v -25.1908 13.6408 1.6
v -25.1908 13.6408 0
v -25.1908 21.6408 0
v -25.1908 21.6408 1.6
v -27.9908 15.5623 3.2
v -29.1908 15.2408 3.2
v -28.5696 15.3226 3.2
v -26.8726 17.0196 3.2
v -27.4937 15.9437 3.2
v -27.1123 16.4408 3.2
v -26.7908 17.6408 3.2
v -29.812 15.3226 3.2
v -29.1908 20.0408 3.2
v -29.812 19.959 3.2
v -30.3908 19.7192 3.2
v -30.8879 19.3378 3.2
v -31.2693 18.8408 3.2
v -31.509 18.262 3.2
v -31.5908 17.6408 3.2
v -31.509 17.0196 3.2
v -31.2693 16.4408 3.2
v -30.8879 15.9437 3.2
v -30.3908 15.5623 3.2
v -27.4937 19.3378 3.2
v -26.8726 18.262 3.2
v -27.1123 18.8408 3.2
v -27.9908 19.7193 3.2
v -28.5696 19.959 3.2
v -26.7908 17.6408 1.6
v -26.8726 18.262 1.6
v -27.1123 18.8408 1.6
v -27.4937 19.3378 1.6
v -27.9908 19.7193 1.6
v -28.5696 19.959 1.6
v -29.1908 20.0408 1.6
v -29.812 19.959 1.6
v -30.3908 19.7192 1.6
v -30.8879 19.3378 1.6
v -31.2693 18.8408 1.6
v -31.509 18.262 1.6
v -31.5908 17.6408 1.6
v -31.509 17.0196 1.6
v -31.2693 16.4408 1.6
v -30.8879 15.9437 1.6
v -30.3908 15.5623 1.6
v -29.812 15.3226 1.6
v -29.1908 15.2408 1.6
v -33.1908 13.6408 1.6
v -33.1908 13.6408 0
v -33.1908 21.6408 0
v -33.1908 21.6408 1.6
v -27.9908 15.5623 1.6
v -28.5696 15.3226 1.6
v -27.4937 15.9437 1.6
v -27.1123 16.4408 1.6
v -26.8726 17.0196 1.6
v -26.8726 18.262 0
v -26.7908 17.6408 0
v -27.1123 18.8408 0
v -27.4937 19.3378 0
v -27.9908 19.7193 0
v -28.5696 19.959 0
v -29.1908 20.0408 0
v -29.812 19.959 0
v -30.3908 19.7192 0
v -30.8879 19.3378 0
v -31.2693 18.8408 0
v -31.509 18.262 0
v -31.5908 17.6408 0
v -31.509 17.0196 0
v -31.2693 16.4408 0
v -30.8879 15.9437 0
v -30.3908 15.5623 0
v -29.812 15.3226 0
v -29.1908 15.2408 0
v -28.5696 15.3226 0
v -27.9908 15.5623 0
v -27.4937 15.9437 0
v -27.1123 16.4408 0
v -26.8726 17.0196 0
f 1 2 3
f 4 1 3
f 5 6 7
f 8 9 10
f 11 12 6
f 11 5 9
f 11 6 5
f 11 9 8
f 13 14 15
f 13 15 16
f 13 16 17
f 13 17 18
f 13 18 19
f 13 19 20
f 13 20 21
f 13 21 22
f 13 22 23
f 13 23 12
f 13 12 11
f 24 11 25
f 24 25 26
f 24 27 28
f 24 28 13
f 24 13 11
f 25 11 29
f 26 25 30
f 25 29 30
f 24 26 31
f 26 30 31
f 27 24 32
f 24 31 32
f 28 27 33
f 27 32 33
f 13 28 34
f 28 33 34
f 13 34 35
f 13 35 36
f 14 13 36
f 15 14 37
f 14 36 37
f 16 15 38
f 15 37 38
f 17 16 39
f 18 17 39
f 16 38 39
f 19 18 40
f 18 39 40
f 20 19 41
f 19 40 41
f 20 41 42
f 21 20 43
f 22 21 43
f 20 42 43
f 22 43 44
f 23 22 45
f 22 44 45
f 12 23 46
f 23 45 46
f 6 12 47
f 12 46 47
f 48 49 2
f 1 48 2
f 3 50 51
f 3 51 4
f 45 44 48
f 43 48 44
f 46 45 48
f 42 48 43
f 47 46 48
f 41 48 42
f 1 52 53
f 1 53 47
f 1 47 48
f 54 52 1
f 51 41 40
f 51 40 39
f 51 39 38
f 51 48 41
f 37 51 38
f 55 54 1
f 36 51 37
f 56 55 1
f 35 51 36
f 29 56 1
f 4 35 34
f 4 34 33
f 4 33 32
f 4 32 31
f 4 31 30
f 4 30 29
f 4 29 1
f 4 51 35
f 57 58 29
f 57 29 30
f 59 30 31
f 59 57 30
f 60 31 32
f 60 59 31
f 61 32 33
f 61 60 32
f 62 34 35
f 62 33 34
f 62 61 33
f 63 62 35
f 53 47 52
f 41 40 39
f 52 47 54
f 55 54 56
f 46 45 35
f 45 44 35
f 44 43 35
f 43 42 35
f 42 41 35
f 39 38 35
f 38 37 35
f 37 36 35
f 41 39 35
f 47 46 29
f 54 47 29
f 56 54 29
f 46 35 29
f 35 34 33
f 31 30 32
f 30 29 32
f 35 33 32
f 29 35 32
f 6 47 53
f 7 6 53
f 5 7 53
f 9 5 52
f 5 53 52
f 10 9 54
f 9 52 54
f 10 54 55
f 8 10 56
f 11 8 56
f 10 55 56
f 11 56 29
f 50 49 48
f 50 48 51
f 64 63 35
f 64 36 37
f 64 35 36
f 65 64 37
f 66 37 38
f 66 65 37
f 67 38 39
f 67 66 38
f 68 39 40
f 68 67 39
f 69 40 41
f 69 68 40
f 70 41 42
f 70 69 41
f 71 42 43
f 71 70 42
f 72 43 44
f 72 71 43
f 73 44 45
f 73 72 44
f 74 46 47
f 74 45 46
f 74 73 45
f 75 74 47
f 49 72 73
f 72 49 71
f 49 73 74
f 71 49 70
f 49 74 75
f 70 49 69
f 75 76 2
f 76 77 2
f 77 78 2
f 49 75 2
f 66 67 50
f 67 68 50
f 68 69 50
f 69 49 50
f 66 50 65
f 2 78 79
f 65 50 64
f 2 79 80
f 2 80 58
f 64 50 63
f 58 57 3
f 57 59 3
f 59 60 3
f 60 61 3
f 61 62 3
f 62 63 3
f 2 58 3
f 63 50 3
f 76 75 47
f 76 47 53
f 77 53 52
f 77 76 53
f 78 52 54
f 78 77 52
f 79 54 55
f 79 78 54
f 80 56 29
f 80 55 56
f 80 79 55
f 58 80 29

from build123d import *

# Parameters (mm, degrees)
F1_DEPTH = 3.2
F0_W     = 8
F0_H     = 8
F2_DEPTH = 1.6
F3_DEPTH = 1.6


with BuildPart() as f1:
    # F0 (on Top) → F1 (new body)
    with BuildSketch(Plane.XY):
        with BuildLine():
            Line((-29.190794, 15.240789), (-29.190794, 20.040789))
            ThreePointArc((-29.190794, 20.040789), (-31.590794, 17.640789), (-29.190794, 15.240789))
        make_face()
        with BuildLine():
            ThreePointArc((-29.190794, 15.240789), (-27.493737, 15.943732), (-26.790794, 17.640789))
            ThreePointArc((-26.790794, 17.640789), (-27.493737, 19.337845), (-29.190794, 20.040789))
            Line((-29.190794, 20.040789), (-29.190794, 15.240789))
        make_face()
    extrude(amount=F1_DEPTH)

    # F0 (on Top) → F2 (join)
    with BuildSketch(Plane.XY):
        with Locations((-29.190794, 17.640789)):
            Rectangle(F0_W, F0_H)
        with BuildLine():
            ThreePointArc((-29.190794, 20.040789), (-27.493737, 19.337845), (-26.790794, 17.640789))
            ThreePointArc((-26.790794, 17.640789), (-27.493737, 15.943732), (-29.190794, 15.240789))
            ThreePointArc((-29.190794, 15.240789), (-31.590794, 17.640789), (-29.190794, 20.040789))
        make_face(mode=Mode.SUBTRACT)
    extrude(amount=F2_DEPTH)

    # F0 (on Top) → F3 (cut)
    with BuildSketch(Plane.XY):
        with BuildLine():
            Line((-29.190794, 15.240789), (-29.190794, 20.040789))
            ThreePointArc((-29.190794, 20.040789), (-31.590794, 17.640789), (-29.190794, 15.240789))
        make_face()
        with BuildLine():
            ThreePointArc((-29.190794, 15.240789), (-27.493737, 15.943732), (-26.790794, 17.640789))
            ThreePointArc((-26.790794, 17.640789), (-27.493737, 19.337845), (-29.190794, 20.040789))
            Line((-29.190794, 20.040789), (-29.190794, 15.240789))
        make_face()
    extrude(amount=F3_DEPTH, mode=Mode.SUBTRACT)


solid = f1.part
